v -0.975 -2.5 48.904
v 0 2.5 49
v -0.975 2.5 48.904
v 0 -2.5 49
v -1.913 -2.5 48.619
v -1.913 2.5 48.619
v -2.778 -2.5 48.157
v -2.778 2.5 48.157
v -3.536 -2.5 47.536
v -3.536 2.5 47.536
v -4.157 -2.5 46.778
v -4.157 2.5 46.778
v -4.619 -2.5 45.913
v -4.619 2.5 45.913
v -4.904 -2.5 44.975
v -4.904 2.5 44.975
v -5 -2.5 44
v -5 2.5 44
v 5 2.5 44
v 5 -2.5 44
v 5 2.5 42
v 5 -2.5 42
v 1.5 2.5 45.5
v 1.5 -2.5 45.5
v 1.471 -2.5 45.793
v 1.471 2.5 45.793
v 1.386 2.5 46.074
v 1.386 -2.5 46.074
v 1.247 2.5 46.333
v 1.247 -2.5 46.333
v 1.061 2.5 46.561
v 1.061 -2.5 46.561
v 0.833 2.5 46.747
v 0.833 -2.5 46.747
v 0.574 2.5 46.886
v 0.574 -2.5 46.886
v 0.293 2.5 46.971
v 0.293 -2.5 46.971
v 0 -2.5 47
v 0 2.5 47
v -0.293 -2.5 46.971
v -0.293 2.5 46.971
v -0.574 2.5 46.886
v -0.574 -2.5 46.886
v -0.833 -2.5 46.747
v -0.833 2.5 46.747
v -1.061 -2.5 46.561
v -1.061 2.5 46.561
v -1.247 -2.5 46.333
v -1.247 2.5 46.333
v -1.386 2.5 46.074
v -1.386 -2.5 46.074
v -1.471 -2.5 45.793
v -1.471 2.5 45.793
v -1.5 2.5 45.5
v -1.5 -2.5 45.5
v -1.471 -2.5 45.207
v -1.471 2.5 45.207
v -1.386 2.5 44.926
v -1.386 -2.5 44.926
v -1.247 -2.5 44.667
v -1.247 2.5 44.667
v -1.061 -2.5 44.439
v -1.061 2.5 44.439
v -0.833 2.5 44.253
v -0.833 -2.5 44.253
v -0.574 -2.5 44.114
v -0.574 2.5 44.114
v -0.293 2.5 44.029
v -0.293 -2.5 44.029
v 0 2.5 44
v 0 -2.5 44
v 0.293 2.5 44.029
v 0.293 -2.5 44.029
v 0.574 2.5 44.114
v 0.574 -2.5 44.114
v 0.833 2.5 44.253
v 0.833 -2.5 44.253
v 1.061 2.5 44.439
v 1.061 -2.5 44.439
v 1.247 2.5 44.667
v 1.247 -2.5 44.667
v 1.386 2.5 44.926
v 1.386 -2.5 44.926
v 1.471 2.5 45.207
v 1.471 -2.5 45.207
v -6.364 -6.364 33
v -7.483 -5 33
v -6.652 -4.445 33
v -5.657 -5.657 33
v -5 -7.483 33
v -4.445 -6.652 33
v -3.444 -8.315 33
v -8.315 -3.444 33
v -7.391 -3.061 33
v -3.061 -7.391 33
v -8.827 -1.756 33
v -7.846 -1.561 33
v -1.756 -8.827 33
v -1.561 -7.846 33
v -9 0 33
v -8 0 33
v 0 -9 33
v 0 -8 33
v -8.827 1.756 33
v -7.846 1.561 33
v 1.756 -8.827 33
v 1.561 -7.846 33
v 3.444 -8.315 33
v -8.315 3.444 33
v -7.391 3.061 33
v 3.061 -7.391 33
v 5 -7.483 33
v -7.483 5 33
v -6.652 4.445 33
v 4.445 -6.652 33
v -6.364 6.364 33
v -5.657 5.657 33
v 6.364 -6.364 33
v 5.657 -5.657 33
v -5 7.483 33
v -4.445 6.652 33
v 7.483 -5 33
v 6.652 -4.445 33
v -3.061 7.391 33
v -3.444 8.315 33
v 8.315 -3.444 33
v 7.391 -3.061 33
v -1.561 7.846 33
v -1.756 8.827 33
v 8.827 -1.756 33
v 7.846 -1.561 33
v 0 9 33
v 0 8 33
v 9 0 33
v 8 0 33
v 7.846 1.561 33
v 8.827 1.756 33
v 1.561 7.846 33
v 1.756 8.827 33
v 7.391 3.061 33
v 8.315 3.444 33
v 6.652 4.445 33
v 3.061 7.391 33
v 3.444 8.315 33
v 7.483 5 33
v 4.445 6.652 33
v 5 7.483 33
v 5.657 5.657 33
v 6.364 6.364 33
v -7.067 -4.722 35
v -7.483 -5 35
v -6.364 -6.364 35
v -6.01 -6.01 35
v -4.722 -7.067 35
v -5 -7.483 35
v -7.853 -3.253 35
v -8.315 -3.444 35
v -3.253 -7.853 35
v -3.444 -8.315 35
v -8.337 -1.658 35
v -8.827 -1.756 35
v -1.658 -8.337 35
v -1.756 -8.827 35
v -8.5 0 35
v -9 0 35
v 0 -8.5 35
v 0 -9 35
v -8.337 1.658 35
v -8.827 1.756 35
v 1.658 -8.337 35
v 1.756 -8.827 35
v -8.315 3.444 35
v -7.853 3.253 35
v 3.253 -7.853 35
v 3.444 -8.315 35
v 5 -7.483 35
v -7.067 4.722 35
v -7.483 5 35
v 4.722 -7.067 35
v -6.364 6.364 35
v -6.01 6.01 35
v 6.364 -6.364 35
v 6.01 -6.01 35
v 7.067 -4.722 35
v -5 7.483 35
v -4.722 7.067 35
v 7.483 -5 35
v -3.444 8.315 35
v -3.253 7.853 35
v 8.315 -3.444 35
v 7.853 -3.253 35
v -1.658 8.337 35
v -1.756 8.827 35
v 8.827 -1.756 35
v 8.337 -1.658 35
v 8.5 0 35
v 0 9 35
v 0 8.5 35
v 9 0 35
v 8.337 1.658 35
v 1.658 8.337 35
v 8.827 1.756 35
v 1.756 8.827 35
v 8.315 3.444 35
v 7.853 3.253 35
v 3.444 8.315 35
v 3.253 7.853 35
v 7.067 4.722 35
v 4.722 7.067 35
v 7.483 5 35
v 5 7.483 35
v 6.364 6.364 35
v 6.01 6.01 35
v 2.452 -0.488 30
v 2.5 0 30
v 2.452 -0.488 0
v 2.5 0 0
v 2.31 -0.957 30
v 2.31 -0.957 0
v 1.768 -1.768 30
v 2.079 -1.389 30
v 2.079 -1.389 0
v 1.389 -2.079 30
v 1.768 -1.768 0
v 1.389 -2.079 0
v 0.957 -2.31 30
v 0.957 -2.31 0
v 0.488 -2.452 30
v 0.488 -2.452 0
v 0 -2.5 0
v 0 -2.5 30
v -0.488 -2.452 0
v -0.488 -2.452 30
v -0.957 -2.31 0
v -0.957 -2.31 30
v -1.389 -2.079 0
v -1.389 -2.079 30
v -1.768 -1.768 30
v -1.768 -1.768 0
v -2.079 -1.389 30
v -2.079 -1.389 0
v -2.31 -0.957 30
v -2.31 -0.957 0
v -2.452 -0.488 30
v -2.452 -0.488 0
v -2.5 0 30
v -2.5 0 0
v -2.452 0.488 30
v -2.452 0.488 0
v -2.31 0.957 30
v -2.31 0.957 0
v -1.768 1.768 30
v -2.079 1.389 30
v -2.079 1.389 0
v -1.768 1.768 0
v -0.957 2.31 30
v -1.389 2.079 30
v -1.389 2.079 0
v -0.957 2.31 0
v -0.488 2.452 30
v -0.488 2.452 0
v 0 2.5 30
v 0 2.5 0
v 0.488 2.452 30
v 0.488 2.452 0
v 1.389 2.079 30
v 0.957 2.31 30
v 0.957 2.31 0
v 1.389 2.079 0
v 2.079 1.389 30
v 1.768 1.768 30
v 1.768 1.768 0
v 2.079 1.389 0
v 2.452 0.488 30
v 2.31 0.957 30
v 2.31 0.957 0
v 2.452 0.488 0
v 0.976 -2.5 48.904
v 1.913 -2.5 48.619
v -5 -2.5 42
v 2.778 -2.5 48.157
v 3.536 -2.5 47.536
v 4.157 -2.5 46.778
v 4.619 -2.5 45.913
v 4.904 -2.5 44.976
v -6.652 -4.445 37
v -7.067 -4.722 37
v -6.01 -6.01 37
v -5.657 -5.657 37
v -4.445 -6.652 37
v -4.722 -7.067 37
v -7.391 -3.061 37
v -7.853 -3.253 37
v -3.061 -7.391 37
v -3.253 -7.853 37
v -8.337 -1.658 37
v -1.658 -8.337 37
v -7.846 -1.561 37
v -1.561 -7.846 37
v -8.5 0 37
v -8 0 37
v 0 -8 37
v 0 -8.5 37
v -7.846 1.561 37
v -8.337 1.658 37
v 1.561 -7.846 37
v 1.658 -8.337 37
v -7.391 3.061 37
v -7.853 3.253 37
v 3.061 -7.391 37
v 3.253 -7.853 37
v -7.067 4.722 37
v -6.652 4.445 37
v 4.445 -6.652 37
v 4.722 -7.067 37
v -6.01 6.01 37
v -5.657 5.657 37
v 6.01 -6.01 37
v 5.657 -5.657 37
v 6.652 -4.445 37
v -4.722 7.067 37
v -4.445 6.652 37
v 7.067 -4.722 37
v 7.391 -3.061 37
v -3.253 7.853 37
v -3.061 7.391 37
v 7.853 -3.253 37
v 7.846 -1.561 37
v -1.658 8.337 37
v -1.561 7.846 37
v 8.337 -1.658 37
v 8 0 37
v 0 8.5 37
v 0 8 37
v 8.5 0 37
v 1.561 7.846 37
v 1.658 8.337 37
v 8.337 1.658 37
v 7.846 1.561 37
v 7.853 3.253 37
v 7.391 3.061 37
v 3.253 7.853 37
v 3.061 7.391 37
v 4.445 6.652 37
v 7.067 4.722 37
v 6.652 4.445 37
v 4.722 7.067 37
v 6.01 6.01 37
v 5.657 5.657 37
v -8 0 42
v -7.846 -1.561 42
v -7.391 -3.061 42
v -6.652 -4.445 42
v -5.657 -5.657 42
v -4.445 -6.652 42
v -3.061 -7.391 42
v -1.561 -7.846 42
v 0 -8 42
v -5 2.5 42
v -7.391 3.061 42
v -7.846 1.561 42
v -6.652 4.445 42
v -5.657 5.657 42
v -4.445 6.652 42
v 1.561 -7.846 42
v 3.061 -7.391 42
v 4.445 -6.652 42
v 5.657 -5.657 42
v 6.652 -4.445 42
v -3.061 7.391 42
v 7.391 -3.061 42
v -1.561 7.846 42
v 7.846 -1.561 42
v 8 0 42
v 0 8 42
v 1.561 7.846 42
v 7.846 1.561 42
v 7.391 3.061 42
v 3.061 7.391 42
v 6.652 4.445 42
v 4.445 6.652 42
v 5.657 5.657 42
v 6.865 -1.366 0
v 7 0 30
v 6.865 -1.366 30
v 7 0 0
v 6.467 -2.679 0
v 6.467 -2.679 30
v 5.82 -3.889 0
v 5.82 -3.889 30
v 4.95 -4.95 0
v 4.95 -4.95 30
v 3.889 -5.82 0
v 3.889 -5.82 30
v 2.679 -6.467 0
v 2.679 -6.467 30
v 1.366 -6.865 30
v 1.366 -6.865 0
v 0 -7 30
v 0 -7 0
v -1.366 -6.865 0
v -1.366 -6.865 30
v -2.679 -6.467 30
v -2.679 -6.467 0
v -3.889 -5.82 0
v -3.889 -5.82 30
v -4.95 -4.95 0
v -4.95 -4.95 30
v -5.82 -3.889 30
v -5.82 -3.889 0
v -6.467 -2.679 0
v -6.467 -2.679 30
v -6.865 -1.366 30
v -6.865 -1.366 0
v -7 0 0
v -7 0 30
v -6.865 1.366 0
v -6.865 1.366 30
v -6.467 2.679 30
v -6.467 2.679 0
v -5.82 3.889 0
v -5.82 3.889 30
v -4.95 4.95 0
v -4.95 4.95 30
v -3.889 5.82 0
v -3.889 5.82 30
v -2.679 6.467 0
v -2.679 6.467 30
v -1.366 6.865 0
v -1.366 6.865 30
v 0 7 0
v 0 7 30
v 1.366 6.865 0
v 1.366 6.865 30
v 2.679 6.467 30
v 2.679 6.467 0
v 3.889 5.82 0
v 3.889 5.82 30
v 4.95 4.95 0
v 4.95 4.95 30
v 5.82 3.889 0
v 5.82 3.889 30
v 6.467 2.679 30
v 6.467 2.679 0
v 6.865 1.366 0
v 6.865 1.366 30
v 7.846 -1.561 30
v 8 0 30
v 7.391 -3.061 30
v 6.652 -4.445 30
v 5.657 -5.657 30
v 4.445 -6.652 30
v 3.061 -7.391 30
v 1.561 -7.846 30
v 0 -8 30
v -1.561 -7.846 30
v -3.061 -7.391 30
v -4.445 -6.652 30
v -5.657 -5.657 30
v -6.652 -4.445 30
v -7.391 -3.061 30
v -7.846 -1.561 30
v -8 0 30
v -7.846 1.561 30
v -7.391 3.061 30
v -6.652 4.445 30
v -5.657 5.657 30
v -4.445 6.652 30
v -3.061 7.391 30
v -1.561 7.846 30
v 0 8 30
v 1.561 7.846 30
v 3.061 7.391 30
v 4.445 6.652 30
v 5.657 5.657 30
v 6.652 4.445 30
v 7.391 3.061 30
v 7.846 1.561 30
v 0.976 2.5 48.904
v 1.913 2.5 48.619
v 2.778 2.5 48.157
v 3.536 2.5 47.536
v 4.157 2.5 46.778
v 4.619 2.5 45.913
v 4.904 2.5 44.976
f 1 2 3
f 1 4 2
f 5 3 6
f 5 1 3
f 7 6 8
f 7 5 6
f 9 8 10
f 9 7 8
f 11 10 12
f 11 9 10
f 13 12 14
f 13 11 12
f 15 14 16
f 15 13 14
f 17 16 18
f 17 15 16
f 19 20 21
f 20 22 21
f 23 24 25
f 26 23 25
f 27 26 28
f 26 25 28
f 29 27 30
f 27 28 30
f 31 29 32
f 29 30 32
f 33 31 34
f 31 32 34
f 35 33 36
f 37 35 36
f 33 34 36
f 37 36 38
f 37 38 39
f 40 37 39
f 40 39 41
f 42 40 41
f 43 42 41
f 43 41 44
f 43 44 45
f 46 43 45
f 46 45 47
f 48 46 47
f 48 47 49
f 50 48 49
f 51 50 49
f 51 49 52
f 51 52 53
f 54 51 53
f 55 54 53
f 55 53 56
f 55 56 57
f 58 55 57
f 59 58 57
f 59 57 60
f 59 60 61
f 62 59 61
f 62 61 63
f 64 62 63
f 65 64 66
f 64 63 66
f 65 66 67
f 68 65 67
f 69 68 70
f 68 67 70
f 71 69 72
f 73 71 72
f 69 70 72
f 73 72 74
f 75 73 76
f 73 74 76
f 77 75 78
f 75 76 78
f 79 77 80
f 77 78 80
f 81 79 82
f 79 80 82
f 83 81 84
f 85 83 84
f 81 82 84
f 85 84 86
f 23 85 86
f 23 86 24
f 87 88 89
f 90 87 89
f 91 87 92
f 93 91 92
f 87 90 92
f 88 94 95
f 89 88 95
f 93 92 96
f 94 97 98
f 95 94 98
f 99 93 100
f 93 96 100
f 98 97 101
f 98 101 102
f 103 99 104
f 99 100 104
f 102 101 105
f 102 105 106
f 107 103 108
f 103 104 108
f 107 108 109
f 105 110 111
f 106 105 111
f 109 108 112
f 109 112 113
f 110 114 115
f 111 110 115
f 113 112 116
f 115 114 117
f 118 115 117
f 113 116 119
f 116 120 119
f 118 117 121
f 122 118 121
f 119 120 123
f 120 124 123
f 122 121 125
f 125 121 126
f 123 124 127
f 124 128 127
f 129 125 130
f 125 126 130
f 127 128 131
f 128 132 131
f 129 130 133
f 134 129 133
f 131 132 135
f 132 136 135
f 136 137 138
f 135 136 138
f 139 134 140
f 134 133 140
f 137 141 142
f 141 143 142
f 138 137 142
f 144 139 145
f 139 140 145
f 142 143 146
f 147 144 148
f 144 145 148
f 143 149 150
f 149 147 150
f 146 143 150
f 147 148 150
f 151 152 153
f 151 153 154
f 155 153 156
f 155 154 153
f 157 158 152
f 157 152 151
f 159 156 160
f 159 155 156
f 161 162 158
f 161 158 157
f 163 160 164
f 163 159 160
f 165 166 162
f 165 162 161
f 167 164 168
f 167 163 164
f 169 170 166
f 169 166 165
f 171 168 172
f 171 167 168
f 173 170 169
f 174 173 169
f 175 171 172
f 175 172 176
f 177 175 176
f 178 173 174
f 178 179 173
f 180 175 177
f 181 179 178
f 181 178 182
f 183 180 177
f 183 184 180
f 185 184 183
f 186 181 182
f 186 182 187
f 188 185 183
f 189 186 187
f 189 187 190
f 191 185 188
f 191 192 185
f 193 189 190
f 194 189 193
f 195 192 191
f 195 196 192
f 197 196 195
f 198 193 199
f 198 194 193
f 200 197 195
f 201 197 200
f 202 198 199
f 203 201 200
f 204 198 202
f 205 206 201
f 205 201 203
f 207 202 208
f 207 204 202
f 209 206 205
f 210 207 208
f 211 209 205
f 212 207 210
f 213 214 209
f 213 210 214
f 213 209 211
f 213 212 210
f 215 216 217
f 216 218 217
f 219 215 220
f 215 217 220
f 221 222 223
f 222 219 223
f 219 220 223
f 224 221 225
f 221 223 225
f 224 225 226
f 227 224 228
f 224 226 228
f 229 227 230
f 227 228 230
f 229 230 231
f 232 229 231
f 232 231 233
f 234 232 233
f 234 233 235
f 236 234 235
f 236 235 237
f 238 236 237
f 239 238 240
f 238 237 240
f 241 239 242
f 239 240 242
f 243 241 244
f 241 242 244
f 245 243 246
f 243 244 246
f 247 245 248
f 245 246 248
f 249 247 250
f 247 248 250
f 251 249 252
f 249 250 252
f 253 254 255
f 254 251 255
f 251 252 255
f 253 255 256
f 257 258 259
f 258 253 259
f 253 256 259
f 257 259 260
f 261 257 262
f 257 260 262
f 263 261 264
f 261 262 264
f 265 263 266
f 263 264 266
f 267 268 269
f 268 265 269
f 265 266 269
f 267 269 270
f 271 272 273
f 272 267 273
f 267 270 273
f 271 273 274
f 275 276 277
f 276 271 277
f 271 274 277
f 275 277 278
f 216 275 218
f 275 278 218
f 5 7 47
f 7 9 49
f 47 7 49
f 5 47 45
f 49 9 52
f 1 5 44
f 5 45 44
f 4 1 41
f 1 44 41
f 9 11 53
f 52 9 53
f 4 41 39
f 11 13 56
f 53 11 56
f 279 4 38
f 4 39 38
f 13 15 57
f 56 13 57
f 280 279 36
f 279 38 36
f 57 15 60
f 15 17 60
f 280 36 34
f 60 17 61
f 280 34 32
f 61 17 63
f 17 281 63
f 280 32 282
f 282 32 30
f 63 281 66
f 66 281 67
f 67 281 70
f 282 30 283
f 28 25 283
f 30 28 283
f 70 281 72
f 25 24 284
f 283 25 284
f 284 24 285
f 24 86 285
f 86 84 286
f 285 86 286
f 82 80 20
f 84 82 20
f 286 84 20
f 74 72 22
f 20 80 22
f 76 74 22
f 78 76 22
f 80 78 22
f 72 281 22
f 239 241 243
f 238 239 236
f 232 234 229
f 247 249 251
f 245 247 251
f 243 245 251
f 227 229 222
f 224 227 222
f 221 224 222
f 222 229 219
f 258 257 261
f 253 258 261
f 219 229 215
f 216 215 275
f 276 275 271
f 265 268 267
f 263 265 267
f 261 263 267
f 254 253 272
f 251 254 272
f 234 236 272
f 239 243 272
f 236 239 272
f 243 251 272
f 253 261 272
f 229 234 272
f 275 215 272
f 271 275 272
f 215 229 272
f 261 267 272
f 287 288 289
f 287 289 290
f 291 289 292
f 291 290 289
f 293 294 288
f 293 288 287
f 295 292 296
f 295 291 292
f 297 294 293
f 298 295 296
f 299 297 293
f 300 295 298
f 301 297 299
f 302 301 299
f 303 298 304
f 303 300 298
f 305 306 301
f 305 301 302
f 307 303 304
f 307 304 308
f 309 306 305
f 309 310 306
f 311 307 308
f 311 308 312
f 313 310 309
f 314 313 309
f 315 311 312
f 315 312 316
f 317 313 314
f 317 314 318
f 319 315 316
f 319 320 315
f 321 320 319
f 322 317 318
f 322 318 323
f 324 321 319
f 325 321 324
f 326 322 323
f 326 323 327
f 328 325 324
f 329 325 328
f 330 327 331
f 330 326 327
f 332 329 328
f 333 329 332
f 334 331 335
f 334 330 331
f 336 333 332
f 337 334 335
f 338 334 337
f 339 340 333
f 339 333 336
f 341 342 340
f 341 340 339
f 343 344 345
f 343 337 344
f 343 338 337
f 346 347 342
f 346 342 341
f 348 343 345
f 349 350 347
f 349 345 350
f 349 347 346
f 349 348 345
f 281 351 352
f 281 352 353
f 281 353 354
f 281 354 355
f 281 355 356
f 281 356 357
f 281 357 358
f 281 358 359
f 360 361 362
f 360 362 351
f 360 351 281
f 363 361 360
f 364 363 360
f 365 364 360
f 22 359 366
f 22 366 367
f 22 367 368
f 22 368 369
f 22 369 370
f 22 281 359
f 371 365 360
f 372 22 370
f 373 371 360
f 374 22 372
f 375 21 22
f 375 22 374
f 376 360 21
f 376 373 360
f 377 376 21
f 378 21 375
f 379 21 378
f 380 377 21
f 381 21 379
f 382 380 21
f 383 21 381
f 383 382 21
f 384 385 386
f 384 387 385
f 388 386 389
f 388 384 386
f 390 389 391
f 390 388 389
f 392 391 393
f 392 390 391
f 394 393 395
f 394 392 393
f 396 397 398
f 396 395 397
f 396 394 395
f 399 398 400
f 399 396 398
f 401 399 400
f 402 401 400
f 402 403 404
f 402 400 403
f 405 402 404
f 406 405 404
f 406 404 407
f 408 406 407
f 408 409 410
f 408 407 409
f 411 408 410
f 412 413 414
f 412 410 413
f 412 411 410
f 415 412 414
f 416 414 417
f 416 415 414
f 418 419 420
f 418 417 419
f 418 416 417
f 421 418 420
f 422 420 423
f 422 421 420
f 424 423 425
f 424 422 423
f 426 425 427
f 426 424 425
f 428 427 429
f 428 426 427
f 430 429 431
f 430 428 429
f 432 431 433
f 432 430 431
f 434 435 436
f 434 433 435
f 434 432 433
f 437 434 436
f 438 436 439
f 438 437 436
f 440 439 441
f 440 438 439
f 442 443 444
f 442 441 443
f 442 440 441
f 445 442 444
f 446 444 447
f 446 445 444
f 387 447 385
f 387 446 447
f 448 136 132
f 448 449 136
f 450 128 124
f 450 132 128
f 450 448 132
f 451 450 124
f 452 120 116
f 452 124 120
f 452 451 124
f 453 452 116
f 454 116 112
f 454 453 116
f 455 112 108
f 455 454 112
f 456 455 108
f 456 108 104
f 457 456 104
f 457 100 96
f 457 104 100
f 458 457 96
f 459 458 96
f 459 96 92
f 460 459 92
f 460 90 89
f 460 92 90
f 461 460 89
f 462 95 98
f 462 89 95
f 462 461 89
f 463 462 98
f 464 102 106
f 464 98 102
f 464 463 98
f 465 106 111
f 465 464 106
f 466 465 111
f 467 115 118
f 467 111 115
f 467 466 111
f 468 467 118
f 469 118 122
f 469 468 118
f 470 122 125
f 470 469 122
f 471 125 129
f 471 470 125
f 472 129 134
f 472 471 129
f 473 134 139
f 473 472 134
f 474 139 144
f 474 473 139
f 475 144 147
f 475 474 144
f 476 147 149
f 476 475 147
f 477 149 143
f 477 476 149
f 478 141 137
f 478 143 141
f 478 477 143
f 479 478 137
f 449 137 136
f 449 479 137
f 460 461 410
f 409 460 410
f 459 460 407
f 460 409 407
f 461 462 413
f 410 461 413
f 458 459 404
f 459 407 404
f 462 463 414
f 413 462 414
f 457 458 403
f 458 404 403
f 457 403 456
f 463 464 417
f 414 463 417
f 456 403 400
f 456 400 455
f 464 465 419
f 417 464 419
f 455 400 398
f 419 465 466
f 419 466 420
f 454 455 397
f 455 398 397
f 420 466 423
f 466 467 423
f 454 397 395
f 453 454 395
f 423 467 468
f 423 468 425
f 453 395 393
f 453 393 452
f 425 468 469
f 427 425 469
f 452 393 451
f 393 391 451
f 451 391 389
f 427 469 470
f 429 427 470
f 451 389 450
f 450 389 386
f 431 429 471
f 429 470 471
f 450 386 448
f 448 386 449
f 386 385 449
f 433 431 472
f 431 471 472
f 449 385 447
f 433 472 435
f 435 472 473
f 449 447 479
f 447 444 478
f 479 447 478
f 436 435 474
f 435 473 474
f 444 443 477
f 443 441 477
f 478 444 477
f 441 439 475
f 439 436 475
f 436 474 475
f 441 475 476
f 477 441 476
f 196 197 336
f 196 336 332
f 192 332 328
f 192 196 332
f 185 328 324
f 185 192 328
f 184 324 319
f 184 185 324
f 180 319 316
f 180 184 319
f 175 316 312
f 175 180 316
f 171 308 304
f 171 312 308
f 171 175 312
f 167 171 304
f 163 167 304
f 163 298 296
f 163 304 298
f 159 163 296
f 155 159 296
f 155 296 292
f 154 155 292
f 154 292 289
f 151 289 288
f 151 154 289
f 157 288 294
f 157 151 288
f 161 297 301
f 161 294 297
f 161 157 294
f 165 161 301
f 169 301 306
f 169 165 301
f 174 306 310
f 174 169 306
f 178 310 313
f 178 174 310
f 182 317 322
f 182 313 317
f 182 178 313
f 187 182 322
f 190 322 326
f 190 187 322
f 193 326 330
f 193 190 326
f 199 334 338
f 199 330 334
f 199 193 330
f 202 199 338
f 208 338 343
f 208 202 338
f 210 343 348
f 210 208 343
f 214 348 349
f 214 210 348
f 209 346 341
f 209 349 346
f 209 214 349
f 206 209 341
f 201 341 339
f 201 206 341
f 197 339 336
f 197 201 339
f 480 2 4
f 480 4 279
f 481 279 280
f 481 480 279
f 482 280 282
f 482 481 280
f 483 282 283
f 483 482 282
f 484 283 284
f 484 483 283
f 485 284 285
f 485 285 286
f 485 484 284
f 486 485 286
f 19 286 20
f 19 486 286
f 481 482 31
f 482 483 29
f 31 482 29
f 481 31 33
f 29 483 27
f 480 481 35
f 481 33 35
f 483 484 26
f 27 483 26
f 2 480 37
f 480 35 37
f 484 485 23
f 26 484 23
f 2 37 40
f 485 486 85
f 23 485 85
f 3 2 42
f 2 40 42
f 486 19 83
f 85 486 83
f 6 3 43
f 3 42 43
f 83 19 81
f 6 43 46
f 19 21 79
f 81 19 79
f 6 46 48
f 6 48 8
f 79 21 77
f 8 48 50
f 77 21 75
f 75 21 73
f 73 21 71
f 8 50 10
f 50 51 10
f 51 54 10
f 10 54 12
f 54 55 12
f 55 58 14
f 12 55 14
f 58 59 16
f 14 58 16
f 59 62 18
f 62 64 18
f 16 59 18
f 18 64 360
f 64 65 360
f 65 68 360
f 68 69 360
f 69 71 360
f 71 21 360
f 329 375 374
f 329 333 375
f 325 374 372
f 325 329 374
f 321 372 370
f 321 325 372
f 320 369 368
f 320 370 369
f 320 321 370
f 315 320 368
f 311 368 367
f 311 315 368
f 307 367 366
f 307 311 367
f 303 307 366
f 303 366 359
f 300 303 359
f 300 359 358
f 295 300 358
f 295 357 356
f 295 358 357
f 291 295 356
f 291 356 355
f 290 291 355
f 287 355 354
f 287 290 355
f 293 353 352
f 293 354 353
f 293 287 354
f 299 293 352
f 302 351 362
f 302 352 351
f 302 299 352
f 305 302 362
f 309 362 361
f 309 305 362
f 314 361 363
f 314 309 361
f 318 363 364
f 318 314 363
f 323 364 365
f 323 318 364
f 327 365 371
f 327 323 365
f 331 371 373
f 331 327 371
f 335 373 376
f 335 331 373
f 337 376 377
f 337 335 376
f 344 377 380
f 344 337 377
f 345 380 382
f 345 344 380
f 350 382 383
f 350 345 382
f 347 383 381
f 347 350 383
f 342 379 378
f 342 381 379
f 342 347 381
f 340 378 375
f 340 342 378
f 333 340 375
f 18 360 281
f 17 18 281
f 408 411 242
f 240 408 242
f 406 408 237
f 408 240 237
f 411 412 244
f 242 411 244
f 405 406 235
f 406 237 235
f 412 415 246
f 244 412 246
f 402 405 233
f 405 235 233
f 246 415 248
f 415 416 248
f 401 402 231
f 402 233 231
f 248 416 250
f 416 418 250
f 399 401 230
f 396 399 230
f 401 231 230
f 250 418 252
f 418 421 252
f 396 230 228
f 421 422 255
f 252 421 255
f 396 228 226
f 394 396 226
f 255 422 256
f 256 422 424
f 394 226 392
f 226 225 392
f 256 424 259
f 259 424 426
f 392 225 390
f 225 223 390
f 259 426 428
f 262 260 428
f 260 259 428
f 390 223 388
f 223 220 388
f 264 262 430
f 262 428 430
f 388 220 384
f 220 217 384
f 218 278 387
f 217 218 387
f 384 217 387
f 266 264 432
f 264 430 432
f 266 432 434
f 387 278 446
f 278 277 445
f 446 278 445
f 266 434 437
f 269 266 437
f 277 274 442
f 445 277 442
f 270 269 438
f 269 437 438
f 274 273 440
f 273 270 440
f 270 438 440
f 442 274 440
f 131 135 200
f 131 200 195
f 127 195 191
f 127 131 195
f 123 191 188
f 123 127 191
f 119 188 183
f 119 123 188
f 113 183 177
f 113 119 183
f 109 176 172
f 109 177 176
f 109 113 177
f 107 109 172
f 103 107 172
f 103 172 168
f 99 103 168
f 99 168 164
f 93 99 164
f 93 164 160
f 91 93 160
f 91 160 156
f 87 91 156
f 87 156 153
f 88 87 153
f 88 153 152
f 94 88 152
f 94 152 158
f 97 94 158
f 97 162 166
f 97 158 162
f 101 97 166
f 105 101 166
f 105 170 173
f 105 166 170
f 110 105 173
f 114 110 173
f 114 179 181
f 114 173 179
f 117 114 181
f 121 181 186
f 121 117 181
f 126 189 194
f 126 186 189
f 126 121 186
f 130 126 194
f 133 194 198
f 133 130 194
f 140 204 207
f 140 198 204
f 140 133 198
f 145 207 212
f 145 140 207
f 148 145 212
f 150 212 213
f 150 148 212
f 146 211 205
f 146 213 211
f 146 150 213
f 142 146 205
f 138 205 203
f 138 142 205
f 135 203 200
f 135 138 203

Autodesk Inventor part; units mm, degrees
ref_plane "YZ Plane" through (0, 0, 0) normal (1, 0, 0) x (0, 1, 0)
ref_plane "XZ Plane" through (0, 0, 0) normal (0, 1, 0) x (-1, 0, 0)
ref_plane "XY Plane" through (0, 0, 0) normal (0, 0, 1) x (1, 0, 0)
sketch "スケッチ1" plane through (0, 0, 0) normal (0, 0, 1) x (1, 0, 0)
  circle A0 centre (0, 0) radius 7
  circle A1 centre (0, 0) radius 2.5
  dimension "d0" = 14
  dimension "d1" = 5
extrude "押し出し1" add sketch "スケッチ1" along normal blind 30
sketch "スケッチ2" plane through (0, 0, 30) normal (0, 0, 1) x (1, 0, 0)
  circle A0 centre (0, 0) radius 8
  dimension "d4" = 16
extrude "押し出し2" add sketch "スケッチ2" along normal blind 3
sketch "スケッチ3" plane through (0, 0, 33) normal (0, 0, 1) x (1, 0, 0)
  circle A0 centre (0, 0) radius 9
  dimension "d7" = 18
extrude "押し出し3" add sketch "スケッチ3" along normal blind 2
sketch "スケッチ4" plane through (0, 0, 35) normal (0, 0, 1) x (1, 0, 0)
  circle A0 centre (0, 0) radius 8.5
  dimension "d10" = 17
extrude "押し出し4" add sketch "スケッチ4" along normal blind 2
sketch "スケッチ5" plane through (0, 0, 37) normal (0, 0, 1) x (1, 0, 0)
  circle A0 centre (0, 0) radius 8
  dimension "d13" = 16
extrude "押し出し5" add sketch "スケッチ5" along normal blind 5
sketch "スケッチ6" plane through (0, 0, 42) normal (0, 0, 1) x (1, 0, 0)
  line L0 (-5, -2.5) -> (5, -2.5)
  line L1 (5, -2.5) -> (5, 2.5)
  line L2 (5, 2.5) -> (-5, 2.5)
  line L3 (-5, 2.5) -> (-5, -2.5)
  line L4 (-5, -2.5) -> (5, 2.5) construction
  line L5 (5, -2.5) -> (-5, 2.5) construction
  point P0 (0, 0)
  dimension "d16" = 10
  dimension "d17" = 5
extrude "押し出し6" add sketch "スケッチ6" along normal blind 7
fillet "フィレット1" radius 5 1 edges at (-5, 0, 49)
fillet "フィレット2" radius 5 1 edges at (5, 0, 49)
sketch "スケッチ7" plane through (-5, -2.5, 42) normal (0, -1, 0) x (1, 0, 0)
  arc A0 (10, 2) -> (0, 2) centre (5, 2) ccw projected
  line L0 (0, 0) -> (0, 2) projected
  line L1 (10, 0) -> (0, 0) projected
  line L2 (10, 0) -> (10, 2) projected
  circle A1 centre (5, 3.5) radius 1.5
  point P0 (5, -42)
  dimension "d22" = 3
  dimension "d23" = 2
extrude "押し出し7" cut sketch "スケッチ7" against normal blind 8 contours A1
properties part number "タミヤダンパー"
